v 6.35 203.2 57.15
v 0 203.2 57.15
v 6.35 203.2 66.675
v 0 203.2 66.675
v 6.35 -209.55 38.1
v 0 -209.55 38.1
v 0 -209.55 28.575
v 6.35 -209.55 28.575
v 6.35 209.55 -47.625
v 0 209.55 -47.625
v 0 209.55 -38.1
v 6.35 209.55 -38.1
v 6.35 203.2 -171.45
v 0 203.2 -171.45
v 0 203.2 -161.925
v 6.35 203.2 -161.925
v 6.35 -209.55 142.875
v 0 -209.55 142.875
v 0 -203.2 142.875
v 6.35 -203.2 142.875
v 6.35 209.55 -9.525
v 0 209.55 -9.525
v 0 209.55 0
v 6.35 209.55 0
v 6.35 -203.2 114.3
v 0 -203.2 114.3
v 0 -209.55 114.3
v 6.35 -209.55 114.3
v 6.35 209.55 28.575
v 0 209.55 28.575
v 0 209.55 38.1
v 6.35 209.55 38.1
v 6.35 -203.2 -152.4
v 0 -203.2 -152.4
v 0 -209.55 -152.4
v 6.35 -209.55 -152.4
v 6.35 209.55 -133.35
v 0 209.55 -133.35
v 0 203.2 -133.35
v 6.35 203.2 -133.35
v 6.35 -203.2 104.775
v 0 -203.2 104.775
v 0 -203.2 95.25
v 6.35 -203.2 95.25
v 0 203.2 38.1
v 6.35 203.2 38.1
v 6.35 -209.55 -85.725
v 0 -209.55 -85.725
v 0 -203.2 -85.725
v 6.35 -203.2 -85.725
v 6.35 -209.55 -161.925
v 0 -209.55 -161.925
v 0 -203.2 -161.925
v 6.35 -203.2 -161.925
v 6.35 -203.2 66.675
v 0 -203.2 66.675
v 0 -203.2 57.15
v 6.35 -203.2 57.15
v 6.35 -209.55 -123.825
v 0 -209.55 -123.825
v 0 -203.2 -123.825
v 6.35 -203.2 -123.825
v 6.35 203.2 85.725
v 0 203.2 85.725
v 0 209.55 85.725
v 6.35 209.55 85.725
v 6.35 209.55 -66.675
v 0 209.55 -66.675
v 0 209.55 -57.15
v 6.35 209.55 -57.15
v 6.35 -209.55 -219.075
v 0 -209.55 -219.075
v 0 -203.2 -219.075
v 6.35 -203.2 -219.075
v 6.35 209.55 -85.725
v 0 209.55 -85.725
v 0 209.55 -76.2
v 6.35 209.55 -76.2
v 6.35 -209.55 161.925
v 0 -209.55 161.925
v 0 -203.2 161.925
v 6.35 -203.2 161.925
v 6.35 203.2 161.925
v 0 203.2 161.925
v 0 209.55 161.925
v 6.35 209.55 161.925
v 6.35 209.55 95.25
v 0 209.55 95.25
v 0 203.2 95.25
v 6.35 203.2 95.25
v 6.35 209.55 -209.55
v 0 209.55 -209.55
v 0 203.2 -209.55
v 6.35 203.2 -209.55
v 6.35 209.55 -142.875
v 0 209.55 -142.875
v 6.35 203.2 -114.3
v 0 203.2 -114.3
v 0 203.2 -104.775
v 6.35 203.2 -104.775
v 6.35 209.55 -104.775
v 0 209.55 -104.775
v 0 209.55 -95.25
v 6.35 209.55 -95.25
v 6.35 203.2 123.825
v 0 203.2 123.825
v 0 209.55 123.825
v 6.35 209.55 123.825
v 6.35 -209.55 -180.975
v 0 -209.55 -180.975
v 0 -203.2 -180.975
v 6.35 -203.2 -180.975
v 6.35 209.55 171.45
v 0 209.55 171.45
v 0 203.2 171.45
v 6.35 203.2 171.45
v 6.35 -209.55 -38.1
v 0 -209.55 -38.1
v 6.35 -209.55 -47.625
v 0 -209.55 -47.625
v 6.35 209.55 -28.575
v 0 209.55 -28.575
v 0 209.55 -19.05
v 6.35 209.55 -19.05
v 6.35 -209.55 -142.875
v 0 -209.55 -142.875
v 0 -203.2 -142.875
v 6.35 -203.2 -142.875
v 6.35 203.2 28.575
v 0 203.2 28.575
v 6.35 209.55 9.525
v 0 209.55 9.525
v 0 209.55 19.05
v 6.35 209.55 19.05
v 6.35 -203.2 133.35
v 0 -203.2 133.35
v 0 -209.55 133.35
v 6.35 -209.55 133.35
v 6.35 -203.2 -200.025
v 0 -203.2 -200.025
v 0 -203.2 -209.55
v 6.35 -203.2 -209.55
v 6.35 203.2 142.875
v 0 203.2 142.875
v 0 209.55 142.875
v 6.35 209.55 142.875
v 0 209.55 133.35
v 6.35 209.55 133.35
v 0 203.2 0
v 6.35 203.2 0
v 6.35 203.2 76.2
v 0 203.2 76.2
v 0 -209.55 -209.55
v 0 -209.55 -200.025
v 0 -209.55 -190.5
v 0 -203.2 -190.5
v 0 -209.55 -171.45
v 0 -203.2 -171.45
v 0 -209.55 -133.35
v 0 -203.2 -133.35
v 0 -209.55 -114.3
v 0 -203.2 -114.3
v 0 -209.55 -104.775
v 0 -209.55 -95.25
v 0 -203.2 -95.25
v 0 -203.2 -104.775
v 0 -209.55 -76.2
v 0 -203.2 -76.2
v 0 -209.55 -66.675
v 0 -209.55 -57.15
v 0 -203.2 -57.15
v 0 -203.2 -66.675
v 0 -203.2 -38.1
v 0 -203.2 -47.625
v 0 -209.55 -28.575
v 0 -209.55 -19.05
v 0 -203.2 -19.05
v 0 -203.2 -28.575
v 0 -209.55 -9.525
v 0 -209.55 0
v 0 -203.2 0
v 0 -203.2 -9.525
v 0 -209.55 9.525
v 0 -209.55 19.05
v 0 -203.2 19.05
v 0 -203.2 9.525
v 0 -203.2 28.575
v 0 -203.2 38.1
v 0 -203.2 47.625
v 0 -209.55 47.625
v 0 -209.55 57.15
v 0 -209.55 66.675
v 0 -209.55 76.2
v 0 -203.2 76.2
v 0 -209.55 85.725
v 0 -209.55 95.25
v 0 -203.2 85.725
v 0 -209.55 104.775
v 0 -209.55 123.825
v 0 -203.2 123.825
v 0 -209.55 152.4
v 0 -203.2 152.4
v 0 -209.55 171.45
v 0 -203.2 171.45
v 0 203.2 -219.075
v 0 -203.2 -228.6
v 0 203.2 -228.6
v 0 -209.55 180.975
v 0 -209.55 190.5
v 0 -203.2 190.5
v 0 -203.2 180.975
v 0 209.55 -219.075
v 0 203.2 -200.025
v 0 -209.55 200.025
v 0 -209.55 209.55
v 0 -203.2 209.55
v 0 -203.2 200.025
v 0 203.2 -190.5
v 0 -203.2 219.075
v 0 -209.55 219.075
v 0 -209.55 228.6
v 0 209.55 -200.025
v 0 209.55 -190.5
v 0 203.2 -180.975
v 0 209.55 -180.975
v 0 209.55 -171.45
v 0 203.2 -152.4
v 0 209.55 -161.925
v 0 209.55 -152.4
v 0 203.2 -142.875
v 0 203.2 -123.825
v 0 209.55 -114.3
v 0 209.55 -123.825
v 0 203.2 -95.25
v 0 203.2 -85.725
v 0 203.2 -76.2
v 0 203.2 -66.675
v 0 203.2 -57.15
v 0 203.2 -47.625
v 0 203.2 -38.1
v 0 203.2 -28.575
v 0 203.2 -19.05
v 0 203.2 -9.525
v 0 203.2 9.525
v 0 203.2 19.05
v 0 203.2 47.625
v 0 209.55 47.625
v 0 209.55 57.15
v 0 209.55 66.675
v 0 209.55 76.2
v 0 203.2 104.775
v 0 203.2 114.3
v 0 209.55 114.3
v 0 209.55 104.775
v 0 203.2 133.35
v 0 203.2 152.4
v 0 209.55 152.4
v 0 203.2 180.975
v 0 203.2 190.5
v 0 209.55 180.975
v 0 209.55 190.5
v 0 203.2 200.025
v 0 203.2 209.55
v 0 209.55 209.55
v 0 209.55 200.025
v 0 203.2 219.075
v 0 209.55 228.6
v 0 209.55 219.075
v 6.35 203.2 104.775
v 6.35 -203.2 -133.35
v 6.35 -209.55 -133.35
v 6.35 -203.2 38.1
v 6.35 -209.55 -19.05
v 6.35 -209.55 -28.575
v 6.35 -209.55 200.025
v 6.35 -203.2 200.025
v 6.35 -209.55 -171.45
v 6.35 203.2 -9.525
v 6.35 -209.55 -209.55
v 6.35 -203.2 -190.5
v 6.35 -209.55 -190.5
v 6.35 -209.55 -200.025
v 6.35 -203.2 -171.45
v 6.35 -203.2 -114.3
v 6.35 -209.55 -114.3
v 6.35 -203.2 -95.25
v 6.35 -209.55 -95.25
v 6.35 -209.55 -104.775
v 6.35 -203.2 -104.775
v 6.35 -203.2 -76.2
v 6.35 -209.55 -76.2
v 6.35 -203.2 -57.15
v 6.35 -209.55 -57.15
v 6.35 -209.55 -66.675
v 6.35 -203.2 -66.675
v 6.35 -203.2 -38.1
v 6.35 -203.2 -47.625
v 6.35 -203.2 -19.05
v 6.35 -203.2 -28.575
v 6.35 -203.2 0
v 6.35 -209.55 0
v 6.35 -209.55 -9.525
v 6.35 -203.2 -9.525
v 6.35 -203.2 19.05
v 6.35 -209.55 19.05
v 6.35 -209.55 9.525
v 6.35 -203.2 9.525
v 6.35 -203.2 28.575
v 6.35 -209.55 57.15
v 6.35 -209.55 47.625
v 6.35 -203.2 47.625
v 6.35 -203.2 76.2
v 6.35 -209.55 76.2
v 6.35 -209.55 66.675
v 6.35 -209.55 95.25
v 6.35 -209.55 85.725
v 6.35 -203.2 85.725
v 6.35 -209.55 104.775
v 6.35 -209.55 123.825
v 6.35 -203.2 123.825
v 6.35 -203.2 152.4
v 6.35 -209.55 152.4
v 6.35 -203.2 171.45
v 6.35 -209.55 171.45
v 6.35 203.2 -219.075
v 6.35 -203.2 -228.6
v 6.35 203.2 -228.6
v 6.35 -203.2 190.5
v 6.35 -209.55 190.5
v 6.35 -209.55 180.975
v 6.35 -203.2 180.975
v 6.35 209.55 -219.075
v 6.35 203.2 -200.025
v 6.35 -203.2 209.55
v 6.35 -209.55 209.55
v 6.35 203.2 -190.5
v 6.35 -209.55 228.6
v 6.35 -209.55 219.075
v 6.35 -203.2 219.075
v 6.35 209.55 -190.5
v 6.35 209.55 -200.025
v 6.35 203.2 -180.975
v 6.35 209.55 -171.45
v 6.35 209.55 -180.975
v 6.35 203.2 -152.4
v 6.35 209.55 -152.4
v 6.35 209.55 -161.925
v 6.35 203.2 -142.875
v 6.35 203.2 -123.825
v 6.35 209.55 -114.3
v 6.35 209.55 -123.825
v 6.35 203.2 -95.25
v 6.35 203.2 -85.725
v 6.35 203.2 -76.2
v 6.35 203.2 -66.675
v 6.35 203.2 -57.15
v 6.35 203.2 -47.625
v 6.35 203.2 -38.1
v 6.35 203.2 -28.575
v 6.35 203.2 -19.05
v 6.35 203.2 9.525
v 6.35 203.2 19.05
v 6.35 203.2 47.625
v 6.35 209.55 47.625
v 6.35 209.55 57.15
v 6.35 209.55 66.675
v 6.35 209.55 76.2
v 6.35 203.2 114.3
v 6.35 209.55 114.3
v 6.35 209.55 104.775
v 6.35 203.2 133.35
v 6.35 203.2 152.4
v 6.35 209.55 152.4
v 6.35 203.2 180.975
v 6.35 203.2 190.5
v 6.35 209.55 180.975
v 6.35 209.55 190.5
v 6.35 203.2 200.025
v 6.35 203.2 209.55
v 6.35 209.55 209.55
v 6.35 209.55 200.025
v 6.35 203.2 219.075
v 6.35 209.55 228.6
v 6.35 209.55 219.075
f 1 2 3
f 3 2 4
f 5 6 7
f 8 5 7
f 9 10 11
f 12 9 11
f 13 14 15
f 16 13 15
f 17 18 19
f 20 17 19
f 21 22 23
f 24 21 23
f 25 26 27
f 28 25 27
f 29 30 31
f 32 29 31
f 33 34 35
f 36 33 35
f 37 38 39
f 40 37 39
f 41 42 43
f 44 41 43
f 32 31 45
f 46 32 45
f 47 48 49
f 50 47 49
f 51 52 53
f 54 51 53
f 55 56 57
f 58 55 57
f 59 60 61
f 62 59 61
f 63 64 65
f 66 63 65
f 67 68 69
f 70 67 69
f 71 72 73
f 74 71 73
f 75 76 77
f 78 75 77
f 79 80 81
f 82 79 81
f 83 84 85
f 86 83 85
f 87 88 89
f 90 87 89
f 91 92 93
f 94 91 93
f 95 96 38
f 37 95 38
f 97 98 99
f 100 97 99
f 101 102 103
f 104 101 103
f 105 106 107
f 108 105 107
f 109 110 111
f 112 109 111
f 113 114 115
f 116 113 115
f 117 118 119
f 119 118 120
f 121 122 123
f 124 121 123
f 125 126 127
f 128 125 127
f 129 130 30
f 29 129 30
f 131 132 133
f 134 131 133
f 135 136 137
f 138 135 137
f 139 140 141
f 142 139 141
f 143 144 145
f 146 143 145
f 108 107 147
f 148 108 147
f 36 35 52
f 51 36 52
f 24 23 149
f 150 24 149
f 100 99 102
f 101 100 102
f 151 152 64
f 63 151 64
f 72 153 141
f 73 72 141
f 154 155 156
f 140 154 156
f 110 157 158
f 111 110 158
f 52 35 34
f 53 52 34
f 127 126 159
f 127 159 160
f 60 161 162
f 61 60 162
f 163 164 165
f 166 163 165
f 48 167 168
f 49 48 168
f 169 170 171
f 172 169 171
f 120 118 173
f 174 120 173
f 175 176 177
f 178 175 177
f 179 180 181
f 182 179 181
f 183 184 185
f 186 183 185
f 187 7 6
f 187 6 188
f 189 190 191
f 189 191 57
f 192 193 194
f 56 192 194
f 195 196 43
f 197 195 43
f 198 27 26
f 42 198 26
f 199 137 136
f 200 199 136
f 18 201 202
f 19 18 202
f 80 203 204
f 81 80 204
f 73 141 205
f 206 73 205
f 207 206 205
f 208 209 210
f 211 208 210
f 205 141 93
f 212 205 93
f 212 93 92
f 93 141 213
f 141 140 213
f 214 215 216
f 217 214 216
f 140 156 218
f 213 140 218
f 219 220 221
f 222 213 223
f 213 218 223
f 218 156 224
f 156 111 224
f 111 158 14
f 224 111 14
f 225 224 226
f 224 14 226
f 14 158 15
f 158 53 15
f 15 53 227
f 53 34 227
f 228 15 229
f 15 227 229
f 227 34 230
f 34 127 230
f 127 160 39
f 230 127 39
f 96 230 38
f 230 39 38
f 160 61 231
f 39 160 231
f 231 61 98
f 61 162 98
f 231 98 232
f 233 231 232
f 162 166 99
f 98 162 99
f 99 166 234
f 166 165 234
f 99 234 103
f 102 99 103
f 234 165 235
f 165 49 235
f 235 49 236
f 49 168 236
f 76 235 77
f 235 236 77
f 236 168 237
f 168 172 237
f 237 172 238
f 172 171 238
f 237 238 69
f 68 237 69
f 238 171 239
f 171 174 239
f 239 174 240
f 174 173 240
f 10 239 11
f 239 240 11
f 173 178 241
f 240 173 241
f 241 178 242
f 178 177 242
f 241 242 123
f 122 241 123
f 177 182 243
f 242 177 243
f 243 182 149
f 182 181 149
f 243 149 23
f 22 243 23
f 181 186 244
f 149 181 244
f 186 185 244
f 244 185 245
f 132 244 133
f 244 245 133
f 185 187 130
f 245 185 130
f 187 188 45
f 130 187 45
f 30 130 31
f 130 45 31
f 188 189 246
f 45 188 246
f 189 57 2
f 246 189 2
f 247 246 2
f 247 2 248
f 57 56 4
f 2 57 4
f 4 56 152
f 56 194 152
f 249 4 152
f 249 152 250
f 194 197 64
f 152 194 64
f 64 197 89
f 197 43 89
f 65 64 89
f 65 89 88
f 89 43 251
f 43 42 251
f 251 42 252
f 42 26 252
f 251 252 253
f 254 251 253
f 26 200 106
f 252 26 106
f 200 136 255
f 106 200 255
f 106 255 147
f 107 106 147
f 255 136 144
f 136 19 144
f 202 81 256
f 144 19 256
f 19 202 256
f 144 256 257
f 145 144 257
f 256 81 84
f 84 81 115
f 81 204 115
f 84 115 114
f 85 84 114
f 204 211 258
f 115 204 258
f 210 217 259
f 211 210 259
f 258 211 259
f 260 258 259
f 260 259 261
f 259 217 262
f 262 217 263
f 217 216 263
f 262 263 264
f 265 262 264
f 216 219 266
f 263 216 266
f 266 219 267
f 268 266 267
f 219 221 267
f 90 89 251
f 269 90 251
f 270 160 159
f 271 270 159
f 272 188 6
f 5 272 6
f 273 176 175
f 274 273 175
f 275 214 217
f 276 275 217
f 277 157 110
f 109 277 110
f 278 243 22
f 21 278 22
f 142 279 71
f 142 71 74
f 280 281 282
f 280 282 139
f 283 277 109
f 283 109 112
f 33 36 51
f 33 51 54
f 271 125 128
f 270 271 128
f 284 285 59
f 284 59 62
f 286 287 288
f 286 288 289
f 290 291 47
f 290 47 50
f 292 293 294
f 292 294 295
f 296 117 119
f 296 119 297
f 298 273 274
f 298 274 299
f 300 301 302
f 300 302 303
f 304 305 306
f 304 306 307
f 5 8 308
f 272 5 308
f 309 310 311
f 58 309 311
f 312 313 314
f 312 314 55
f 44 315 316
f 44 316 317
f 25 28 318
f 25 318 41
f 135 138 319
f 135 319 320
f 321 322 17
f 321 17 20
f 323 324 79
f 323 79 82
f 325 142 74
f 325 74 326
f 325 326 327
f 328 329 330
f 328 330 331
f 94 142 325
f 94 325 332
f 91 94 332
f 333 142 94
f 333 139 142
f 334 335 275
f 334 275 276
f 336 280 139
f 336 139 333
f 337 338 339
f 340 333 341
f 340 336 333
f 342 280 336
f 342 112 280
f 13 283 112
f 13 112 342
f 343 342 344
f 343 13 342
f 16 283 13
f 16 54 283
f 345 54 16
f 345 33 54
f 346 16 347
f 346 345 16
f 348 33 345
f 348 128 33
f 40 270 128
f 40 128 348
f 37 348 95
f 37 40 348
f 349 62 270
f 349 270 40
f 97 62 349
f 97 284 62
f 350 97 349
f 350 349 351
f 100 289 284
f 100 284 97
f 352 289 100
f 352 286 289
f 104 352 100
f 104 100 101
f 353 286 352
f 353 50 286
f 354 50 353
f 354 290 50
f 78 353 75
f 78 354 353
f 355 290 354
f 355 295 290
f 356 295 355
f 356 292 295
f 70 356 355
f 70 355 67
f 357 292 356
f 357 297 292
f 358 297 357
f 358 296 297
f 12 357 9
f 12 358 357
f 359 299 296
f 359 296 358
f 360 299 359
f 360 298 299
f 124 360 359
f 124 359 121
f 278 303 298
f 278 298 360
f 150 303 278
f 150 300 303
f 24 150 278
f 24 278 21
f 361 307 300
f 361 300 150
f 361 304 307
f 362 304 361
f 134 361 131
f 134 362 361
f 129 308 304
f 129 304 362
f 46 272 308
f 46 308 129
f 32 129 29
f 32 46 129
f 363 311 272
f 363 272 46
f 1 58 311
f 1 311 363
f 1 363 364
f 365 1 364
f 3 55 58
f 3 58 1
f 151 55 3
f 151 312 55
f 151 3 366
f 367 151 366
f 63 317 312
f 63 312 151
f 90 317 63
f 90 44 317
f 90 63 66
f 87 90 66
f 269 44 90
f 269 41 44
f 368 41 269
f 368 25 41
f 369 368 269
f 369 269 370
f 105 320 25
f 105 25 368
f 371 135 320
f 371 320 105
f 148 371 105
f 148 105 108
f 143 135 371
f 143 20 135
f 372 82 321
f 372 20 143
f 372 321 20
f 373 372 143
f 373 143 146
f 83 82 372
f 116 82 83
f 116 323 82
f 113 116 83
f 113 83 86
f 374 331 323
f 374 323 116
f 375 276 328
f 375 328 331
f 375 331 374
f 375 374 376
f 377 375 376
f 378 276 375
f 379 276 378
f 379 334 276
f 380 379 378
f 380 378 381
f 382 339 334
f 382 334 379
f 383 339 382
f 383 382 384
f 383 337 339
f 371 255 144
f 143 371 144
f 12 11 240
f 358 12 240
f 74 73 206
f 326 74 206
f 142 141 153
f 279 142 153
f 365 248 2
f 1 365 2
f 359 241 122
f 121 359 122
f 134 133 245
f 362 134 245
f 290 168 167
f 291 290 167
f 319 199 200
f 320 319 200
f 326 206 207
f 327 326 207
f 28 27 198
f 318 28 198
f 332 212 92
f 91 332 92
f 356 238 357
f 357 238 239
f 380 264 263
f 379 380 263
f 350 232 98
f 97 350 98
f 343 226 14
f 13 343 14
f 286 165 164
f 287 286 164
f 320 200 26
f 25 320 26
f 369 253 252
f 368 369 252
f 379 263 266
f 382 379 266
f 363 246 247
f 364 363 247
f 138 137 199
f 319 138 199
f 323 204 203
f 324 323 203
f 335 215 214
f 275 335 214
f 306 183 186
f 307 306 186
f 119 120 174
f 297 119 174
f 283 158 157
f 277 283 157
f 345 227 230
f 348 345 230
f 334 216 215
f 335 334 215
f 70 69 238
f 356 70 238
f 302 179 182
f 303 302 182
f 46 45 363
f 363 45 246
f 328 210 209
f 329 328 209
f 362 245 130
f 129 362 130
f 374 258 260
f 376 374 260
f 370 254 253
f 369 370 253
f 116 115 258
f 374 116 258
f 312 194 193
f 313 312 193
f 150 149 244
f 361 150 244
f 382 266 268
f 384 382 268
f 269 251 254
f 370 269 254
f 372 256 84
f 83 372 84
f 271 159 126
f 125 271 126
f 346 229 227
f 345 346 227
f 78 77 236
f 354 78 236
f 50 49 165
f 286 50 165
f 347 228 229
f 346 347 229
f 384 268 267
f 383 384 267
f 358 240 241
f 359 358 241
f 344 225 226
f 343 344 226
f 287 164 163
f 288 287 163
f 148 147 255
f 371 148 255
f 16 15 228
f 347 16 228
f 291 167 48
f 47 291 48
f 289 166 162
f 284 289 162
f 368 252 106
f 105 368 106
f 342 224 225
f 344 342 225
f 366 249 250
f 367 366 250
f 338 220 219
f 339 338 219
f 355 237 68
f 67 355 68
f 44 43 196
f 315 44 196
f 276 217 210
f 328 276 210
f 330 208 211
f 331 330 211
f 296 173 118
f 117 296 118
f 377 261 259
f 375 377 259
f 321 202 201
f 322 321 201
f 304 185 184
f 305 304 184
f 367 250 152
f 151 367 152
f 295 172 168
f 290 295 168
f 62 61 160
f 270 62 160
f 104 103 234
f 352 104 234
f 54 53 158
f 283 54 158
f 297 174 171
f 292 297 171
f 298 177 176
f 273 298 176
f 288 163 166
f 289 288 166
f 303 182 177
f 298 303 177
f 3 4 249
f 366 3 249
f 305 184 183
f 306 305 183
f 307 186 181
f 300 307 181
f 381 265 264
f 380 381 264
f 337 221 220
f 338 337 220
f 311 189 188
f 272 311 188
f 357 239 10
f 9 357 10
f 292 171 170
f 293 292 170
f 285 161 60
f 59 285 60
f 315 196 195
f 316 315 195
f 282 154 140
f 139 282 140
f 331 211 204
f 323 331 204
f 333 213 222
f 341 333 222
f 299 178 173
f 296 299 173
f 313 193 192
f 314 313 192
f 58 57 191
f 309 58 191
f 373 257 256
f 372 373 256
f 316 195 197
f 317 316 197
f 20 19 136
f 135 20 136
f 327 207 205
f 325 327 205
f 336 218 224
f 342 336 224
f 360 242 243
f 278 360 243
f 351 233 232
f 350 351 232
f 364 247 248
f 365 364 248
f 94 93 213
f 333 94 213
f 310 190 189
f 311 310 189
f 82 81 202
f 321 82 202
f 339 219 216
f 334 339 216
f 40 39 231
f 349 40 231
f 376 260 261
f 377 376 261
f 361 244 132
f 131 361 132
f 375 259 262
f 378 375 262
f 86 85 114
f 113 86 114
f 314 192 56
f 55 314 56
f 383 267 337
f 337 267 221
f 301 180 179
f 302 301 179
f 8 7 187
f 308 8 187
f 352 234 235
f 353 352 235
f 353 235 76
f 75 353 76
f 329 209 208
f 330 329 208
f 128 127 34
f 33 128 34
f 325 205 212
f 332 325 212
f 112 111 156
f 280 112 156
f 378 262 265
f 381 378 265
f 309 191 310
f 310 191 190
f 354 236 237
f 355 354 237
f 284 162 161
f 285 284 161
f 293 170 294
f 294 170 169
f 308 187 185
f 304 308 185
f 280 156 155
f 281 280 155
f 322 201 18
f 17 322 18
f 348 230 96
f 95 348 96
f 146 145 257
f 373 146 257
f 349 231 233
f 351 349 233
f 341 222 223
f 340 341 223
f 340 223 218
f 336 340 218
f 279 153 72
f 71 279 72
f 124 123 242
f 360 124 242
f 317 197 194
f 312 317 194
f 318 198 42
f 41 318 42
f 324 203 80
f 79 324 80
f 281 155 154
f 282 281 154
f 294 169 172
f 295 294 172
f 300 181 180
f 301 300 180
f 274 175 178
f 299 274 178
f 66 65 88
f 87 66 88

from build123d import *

# Parameters (mm, degrees)
F1_DEPTH = 6.35


with BuildPart() as f1:
    # F0 (on Right) → F1 (new body)
    with BuildSketch(Plane.YZ):
        Polygon((-203.2, 228.6), (-209.55, 228.6), (-209.55, 219.075), (-203.2, 219.075), (-203.2, 209.55), (-209.55, 209.55), (-209.55, 200.025), (-203.2, 200.025), (-203.2, 190.5), (-209.55, 190.5), (-209.55, 180.975), (-203.2, 180.975), (-203.2, 171.45), (-209.55, 171.45), (-209.55, 161.925), (-203.2, 161.925), (-203.2, 152.4), (-209.55, 152.4), (-209.55, 142.875), (-203.2, 142.875), (-203.2, 133.35), (-209.55, 133.35), (-209.55, 123.825), (-203.2, 123.825), (-203.2, 114.3), (-209.55, 114.3), (-209.55, 104.775), (-203.2, 104.775), (-203.2, 95.25), (-209.55, 95.25), (-209.55, 85.725), (-203.2, 85.725), (-203.2, 76.2), (-209.55, 76.2), (-209.55, 66.675), (-203.2, 66.675), (-203.2, 57.15), (-209.55, 57.15), (-209.55, 47.625), (-203.2, 47.625), (-203.2, 38.1), (-209.55, 38.1), (-209.55, 28.575), (-203.2, 28.575), (-203.2, 19.05), (-209.55, 19.05), (-209.55, 9.525), (-203.2, 9.525), (-203.2, 0), (-209.55, 0), (-209.55, -9.525), (-203.2, -9.525), (-203.2, -19.05), (-209.55, -19.05), (-209.55, -28.575), (-203.2, -28.575), (-203.2, -38.1), (-209.55, -38.1), (-209.55, -47.625), (-203.2, -47.625), (-203.2, -57.15), (-209.55, -57.15), (-209.55, -66.675), (-203.2, -66.675), (-203.2, -76.2), (-209.55, -76.2), (-209.55, -85.725), (-203.2, -85.725), (-203.2, -95.25), (-209.55, -95.25), (-209.55, -104.775), (-203.2, -104.775), (-203.2, -114.3), (-209.55, -114.3), (-209.55, -123.825), (-203.2, -123.825), (-203.2, -133.35), (-209.55, -133.35), (-209.55, -142.875), (-203.2, -142.875), (-203.2, -152.4), (-209.55, -152.4), (-209.55, -161.925), (-203.2, -161.925), (-203.2, -171.45), (-209.55, -171.45), (-209.55, -180.975), (-203.2, -180.975), (-203.2, -190.5), (-209.55, -190.5), (-209.55, -200.025), (-203.2, -200.025), (-203.2, -209.55), (-209.55, -209.55), (-209.55, -219.075), (-203.2, -219.075), (-203.2, -228.6), (0, -228.6), (0, 228.6), align=None)
        Polygon((203.2, 228.6), (0, 228.6), (0, -228.6), (203.2, -228.6), (203.2, -219.075), (209.55, -219.075), (209.55, -209.55), (203.2, -209.55), (203.2, -200.025), (209.55, -200.025), (209.55, -190.5), (203.2, -190.5), (203.2, -180.975), (209.55, -180.975), (209.55, -171.45), (203.2, -171.45), (203.2, -161.925), (209.55, -161.925), (209.55, -152.4), (203.2, -152.4), (203.2, -142.875), (209.55, -142.875), (209.55, -133.35), (203.2, -133.35), (203.2, -123.825), (209.55, -123.825), (209.55, -114.3), (203.2, -114.3), (203.2, -104.775), (209.55, -104.775), (209.55, -95.25), (203.2, -95.25), (203.2, -85.725), (209.55, -85.725), (209.55, -76.2), (203.2, -76.2), (203.2, -66.675), (209.55, -66.675), (209.55, -57.15), (203.2, -57.15), (203.2, -47.625), (209.55, -47.625), (209.55, -38.1), (203.2, -38.1), (203.2, -28.575), (209.55, -28.575), (209.55, -19.05), (203.2, -19.05), (203.2, -9.525), (209.55, -9.525), (209.55, 0), (203.2, 0), (203.2, 9.525), (209.55, 9.525), (209.55, 19.05), (203.2, 19.05), (203.2, 28.575), (209.55, 28.575), (209.55, 38.1), (203.2, 38.1), (203.2, 47.625), (209.55, 47.625), (209.55, 57.15), (203.2, 57.15), (203.2, 66.675), (209.55, 66.675), (209.55, 76.2), (203.2, 76.2), (203.2, 85.725), (209.55, 85.725), (209.55, 95.25), (203.2, 95.25), (203.2, 104.775), (209.55, 104.775), (209.55, 114.3), (203.2, 114.3), (203.2, 123.825), (209.55, 123.825), (209.55, 133.35), (203.2, 133.35), (203.2, 142.875), (209.55, 142.875), (209.55, 152.4), (203.2, 152.4), (203.2, 161.925), (209.55, 161.925), (209.55, 171.45), (203.2, 171.45), (203.2, 180.975), (209.55, 180.975), (209.55, 190.5), (203.2, 190.5), (203.2, 200.025), (209.55, 200.025), (209.55, 209.55), (203.2, 209.55), (203.2, 219.075), (209.55, 219.075), (209.55, 228.6), align=None)
    extrude(amount=F1_DEPTH)


solid = f1.part
